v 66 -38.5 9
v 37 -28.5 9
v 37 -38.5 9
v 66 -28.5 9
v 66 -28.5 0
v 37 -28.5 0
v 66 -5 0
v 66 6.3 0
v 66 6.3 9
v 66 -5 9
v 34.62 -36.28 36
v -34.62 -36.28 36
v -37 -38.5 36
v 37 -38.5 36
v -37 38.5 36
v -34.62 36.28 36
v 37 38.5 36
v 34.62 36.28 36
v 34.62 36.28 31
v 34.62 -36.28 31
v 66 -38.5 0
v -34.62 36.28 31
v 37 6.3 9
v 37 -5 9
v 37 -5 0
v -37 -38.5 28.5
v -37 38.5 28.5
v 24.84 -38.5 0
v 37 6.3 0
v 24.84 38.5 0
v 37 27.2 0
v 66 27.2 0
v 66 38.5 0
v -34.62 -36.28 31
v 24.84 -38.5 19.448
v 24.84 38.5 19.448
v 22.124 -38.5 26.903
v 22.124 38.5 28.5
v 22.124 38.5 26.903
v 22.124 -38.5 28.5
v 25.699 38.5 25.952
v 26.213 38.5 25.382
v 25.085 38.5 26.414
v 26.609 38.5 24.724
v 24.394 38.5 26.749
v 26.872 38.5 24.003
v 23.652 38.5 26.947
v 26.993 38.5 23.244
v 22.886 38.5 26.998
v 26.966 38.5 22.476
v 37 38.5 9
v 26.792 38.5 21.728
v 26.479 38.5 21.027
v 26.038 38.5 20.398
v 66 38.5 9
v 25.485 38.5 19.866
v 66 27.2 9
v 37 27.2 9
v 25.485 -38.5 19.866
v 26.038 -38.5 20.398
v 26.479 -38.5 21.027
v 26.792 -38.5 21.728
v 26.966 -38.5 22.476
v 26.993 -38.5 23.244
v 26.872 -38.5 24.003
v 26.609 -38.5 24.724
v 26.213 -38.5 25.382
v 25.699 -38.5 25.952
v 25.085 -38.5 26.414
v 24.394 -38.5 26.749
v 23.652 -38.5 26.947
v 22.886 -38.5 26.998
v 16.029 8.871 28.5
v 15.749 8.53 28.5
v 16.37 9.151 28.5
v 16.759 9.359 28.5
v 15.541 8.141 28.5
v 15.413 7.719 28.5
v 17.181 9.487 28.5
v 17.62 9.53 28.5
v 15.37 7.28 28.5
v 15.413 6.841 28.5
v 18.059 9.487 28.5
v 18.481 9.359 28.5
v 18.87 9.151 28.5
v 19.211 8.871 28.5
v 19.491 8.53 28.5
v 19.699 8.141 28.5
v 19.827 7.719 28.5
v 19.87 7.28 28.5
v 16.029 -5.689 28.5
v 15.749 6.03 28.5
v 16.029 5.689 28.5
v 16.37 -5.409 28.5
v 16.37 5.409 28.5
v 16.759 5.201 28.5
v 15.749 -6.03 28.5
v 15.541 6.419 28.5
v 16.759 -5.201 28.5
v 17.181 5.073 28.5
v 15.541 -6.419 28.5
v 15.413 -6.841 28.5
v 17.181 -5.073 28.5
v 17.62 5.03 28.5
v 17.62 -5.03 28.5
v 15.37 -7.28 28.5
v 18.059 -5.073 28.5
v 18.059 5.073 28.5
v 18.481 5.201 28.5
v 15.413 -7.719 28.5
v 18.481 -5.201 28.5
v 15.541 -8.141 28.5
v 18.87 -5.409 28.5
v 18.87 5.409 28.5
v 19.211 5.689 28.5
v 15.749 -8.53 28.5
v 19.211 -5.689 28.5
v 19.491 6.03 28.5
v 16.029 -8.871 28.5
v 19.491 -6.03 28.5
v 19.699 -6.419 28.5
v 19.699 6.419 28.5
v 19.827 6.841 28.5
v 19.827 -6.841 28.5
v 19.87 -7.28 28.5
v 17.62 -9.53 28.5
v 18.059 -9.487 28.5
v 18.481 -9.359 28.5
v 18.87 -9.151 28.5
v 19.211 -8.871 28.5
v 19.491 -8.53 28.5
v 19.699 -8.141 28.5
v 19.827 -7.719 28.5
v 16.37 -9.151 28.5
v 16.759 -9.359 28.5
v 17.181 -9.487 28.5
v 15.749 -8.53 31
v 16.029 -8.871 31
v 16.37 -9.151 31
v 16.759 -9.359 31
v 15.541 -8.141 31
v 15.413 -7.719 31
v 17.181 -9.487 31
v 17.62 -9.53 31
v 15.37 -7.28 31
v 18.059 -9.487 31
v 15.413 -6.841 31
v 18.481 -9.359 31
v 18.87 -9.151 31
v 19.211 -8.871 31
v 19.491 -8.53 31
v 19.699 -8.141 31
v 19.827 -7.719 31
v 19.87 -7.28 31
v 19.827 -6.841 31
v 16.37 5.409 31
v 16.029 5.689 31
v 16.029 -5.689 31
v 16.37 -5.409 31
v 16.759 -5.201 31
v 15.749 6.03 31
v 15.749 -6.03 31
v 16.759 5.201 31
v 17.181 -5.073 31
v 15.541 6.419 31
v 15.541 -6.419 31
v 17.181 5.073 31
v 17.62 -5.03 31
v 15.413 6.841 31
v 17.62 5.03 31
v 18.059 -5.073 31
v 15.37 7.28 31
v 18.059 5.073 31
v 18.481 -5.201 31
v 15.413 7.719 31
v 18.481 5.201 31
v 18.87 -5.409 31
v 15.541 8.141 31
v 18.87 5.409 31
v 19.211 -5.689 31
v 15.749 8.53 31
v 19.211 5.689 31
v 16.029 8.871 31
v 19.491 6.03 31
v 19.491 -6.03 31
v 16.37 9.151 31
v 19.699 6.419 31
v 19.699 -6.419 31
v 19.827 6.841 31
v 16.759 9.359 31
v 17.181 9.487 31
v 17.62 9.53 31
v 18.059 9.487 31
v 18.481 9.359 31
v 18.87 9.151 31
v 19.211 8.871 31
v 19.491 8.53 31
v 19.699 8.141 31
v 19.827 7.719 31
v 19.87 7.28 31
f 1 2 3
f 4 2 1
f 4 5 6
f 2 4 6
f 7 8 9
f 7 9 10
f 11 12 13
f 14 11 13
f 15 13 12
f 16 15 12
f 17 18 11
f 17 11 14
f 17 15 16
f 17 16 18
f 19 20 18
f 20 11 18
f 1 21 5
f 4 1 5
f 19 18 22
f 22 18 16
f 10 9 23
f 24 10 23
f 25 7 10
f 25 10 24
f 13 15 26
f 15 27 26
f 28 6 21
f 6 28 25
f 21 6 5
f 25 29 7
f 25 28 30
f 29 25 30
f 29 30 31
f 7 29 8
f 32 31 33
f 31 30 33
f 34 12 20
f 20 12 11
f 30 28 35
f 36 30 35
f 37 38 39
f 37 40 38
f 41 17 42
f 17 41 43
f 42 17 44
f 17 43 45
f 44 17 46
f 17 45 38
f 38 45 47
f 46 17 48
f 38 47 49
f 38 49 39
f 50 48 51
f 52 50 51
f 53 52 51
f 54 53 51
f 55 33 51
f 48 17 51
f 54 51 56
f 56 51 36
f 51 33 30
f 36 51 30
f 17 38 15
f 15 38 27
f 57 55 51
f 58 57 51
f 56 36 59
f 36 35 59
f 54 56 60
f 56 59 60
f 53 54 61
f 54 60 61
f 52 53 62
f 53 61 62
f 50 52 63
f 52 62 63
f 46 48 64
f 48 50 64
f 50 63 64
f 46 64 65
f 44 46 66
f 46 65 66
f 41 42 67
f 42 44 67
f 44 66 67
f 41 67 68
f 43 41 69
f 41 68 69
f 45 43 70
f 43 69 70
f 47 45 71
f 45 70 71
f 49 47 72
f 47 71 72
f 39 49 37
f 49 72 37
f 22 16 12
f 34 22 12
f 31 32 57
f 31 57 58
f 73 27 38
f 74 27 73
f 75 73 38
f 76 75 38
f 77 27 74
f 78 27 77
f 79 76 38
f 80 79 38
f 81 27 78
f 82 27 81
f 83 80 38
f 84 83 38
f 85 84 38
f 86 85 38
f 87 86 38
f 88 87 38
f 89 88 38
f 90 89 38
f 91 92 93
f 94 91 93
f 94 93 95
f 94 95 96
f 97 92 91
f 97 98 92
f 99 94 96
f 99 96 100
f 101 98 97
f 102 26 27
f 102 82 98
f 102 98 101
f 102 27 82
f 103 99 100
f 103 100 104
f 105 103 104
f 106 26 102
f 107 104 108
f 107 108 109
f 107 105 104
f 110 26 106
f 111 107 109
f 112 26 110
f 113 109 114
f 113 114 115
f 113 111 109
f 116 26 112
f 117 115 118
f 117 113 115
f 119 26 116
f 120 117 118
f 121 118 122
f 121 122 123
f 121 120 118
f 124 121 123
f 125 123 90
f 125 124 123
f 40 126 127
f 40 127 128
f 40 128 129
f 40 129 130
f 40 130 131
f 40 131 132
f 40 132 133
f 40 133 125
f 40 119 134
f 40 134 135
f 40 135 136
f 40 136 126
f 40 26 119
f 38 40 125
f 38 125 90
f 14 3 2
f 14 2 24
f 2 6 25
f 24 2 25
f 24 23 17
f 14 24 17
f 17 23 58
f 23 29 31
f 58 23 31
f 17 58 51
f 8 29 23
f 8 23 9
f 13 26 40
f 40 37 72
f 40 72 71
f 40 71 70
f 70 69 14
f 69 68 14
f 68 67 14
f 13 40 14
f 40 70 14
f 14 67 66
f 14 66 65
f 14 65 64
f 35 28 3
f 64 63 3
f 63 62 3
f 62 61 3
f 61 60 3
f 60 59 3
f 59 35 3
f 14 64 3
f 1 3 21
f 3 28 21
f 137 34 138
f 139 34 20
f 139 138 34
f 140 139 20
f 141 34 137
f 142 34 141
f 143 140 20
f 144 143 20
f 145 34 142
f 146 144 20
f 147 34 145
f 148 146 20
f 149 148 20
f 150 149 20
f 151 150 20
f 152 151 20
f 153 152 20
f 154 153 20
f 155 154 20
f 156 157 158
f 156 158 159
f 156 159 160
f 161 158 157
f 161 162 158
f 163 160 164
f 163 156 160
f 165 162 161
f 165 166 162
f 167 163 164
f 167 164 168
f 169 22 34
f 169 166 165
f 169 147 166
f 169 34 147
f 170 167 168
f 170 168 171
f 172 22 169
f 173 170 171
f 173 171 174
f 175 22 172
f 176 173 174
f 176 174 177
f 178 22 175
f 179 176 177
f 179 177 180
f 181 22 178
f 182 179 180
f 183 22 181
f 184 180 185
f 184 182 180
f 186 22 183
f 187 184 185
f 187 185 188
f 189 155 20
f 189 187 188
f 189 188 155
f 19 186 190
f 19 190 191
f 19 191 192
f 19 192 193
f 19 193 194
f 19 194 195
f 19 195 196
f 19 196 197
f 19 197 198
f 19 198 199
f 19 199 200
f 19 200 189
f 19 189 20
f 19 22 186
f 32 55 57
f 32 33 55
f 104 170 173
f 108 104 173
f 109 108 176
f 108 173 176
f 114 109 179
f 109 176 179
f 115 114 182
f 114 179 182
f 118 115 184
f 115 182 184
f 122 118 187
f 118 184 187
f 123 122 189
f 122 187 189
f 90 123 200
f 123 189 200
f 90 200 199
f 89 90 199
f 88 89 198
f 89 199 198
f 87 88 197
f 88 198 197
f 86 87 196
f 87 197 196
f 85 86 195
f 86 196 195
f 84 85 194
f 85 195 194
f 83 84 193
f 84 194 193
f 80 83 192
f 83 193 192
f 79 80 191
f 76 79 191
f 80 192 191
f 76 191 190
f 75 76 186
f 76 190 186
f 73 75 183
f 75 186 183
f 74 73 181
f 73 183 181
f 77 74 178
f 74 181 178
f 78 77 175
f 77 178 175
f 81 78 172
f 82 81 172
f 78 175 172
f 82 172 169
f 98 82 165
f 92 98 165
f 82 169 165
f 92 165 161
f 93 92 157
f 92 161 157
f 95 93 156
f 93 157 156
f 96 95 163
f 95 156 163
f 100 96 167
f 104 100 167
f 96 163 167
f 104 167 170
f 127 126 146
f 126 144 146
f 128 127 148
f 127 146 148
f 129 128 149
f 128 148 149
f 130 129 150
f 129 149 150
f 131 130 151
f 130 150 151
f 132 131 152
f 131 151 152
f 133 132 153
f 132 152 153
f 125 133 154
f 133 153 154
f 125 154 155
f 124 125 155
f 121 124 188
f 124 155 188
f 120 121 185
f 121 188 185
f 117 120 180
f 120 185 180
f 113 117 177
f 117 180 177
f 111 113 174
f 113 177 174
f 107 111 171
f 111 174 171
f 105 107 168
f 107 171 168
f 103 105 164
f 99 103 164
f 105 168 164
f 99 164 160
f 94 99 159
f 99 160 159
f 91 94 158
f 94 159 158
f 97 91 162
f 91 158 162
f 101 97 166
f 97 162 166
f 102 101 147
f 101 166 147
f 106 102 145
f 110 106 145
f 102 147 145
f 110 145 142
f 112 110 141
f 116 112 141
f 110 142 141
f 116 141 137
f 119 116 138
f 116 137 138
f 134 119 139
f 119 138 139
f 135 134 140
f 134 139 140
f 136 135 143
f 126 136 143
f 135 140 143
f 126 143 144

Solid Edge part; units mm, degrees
sketch "Sketch1" plane through (0, 0, 0) normal (0, 0, 1) x (1, 0, 0)
  line L0 (-37, -38.5) -> (37, -38.5)
  line L1 (37, -38.5) -> (37, 38.5)
  line L2 (37, 38.5) -> (-37, 38.5)
  line L3 (-37, 38.5) -> (-37, -38.5)
  dimension "D1" = 74
  dimension "D2" = 77
extrude "Ajout_matière_1" add sketch "Sketch1" along normal blind 36
sketch "Sketch2" plane through (0, -38.5, 18) normal (0, -1, 0) x (1, 0, 0)
  circle A0 centre (23, 5) radius 4
  dimension "D1" = 8
  dimension "D2" = 60
  dimension "D3" = 13
extrude "Cutout1" cut sketch "Sketch2" along normal through all and the other way through all
sketch "Sketch3" plane through (0, 0, 0) normal (0, 0, 1) x (1, 0, 0)
  line L0 (37, 38.5) -> (66, 38.5)
  line L1 (66, 38.5) -> (66, 27.2)
  line L2 (66, 27.2) -> (37, 27.2)
  line L3 (37, 27.2) -> (37, 38.5)
  line L4 (37, -38.5) -> (66, -38.5)
  line L5 (66, -38.5) -> (66, -28.5)
  line L6 (66, -28.5) -> (37, -28.5)
  line L7 (37, -28.5) -> (37, -38.5)
  line L8 (37, 6.3) -> (66, 6.3)
  line L9 (66, 6.3) -> (66, -5)
  line L10 (66, -5) -> (37, -5)
  line L11 (37, -5) -> (37, 6.3)
  dimension "D1" = 10
  dimension "D2" = 29
  dimension "D3" = 29
  dimension "D4" = 29
  dimension "D5" = 11.3
  dimension "D6" = 11.3
  dimension "D7" = 23.5
extrude "Ajout_matière_2" add sketch "Sketch3" along normal blind 9
sketch "Sketch4" plane through (14.5, -38.5, 18) normal (0, -1, 0) x (1, 0, 0)
  line L0 (-51.5, -18) -> (0.5, -18)
  line L1 (0.5, -18) -> (0.5, 10.5)
  line L2 (0.5, 10.5) -> (-51.5, 10.5)
  line L3 (-51.5, 10.5) -> (-51.5, -18)
  dimension "D1" = 52
  dimension "D2" = 28.5
extrude "Cutout2" cut sketch "Sketch4" against normal through all
sketch "Sketch5" plane through (14.5, -38.5, 18) normal (0, -1, 0) x (1, 0, 0)
  line L0 (0.5, -18) -> (10.3402, -18)
  line L1 (10.3402, -18) -> (10.3402, 6.2121)
  line L2 (7.6235, 6.2121) -> (10.3402, 6.2121)
  line L3 (7.6235, 10.5) -> (7.6235, 6.2121)
  line L4 (0.5, 10.5) -> (7.6235, 10.5)
  line L5 (0.5, 10.5) -> (0.5, 6.2121)
  line L6 (0.5, 6.2121) -> (0.5, -18)
extrude "Cutout3" cut sketch "Sketch5" against normal through all
sketch "Sketch6" plane through (0, 0, 36) normal (0, 0, 1) x (1, 0, 0)
  line L0 (-34.62, -36.28) -> (34.62, -36.28)
  line L1 (34.62, -36.28) -> (34.62, 36.28)
  line L2 (34.62, 36.28) -> (-34.62, 36.28)
  line L3 (-34.62, 36.28) -> (-34.62, -36.28)
  dimension "D1" = 69.24
  dimension "D2" = 72.56
extrude "Enlèvement_matière_5" cut sketch "Sketch6" against normal blind 5
hole "Perçage_1" at (17.62, 7.28, 31) direction (0, 0, -1) diameter 4.5 end up to next
hole "Hole1" at (17.62, -7.28, 31) direction (0, 0, -1) diameter 4.5 end up to next
properties material "Nylon, usage général"
